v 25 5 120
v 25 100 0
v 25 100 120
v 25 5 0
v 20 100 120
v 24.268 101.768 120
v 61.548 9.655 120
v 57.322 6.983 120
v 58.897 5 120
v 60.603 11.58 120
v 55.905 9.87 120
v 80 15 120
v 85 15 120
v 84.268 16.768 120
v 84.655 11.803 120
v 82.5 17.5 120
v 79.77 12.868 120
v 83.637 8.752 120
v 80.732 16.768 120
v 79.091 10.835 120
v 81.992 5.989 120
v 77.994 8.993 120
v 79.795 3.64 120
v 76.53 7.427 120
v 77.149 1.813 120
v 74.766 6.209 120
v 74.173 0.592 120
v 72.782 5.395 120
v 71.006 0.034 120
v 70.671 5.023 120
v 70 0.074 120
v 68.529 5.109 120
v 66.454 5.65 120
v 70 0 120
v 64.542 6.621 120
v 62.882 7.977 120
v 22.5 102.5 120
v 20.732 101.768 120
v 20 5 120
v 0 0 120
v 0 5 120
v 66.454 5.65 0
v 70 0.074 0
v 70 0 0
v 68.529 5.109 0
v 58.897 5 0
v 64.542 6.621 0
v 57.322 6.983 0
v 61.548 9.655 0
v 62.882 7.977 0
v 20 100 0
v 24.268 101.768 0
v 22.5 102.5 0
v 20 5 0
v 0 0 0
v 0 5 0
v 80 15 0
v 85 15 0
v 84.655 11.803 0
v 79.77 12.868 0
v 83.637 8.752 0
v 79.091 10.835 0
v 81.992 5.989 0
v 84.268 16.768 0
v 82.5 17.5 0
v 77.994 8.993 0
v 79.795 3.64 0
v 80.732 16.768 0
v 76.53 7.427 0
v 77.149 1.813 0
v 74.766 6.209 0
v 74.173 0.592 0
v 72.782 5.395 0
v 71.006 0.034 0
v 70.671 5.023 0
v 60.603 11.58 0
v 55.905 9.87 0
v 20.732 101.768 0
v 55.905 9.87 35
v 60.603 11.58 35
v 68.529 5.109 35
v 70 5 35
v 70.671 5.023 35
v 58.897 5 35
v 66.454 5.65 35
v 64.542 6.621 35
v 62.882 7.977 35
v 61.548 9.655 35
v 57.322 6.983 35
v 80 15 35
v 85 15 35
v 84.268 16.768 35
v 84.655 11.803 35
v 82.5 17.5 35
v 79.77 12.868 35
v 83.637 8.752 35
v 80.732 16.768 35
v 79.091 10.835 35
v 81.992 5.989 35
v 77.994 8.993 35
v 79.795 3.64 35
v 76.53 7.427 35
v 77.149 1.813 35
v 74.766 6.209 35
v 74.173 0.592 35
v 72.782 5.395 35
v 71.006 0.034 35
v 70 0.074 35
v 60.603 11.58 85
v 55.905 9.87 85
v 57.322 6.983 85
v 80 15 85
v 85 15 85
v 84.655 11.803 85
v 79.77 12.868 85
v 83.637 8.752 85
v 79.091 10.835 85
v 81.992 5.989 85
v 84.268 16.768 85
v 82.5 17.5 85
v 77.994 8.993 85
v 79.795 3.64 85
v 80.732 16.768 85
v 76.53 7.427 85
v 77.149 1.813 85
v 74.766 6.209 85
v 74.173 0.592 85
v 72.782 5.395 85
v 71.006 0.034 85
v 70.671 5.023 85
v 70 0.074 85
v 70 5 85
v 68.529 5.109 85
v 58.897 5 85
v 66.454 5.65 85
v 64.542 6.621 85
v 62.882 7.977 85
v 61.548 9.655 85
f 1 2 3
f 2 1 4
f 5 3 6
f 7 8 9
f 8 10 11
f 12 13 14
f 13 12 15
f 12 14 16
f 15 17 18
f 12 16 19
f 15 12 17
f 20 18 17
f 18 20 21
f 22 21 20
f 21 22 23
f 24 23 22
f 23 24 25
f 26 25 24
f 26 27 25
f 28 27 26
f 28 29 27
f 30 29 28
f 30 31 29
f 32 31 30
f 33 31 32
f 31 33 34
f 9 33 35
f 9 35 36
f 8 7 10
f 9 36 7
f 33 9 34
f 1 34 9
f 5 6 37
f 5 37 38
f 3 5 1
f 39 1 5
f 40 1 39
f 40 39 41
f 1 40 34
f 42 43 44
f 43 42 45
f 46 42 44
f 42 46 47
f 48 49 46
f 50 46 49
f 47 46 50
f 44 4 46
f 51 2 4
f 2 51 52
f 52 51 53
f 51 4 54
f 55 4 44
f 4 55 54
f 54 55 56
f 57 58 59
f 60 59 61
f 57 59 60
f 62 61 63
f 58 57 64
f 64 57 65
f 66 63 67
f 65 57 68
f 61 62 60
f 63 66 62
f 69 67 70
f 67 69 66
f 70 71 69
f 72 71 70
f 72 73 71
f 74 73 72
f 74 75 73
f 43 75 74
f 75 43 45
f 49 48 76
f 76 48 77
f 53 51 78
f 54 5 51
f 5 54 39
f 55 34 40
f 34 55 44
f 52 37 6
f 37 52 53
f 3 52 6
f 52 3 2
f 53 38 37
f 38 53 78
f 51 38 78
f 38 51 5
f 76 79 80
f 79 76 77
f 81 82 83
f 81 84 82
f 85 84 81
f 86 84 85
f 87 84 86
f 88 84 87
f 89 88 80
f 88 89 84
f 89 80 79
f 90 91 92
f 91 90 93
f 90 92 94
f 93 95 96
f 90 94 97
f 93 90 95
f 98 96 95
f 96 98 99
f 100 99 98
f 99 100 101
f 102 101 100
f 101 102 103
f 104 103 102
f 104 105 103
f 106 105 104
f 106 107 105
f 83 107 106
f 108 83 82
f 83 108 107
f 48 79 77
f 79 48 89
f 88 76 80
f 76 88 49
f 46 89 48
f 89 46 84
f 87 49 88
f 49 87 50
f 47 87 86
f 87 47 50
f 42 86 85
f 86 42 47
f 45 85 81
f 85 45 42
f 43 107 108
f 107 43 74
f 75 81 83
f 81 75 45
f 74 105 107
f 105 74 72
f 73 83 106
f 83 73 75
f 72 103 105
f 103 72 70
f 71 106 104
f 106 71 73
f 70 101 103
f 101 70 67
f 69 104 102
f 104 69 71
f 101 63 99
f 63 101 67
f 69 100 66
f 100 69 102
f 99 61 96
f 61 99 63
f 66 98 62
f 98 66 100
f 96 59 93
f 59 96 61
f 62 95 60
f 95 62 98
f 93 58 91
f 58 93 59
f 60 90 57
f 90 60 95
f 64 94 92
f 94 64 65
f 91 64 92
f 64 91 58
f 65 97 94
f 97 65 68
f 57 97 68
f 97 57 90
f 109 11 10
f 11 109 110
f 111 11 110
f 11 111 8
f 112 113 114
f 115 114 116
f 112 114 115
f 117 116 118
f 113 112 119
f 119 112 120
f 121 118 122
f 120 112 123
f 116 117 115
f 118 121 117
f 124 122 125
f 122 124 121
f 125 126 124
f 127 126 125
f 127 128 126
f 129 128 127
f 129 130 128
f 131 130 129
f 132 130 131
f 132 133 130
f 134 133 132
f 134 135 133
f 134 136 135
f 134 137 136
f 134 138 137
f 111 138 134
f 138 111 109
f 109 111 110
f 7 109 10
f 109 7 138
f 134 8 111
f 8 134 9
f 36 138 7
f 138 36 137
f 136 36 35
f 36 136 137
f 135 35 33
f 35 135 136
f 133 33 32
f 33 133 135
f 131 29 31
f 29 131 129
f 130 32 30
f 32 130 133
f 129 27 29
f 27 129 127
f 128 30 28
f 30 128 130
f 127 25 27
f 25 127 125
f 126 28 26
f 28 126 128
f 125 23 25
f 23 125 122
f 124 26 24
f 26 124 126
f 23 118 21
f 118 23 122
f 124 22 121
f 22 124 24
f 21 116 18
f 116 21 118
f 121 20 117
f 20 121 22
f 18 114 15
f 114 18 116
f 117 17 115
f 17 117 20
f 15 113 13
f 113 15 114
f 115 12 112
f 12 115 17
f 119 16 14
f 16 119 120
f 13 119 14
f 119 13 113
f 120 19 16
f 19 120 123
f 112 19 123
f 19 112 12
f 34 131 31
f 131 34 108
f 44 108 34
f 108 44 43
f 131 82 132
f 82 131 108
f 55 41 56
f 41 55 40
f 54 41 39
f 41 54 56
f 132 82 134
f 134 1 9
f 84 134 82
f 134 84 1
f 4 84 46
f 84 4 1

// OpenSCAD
function kindle_width() = 120;
function kindle_height() = 170;
function kindle_thickness_with_case() = 14;
function kindle_bottom_center_cutout_width() = 50;

function stand_wall_thickness() = 5;
function stand_wall_thickness() = 5;

function stand_foot_depth() = 70;
function stand_foot_arch_a() = 160;
function stand_foot_arch_r() = 10;
function stand_height() = 100;

function stand_vertical_support_offset() = 50; // measured from front

module arch(r = stand_foot_arch_r(), t = stand_wall_thickness(), h = kindle_width(), a = stand_foot_arch_a()) {
       rotate_extrude(angle = a)
            translate([r, 0, 0])
                square([t, h]);
}

module stand_foot_arch_half() {
    half_section_width = (kindle_width() - kindle_bottom_center_cutout_width()) / 2;
    offset_x = stand_foot_depth();
    offset_y = stand_foot_arch_r() + stand_wall_thickness();

    round_end_offset_x = offset_x + stand_foot_arch_r() + stand_wall_thickness() / 2;
    union() {
        translate([offset_x, offset_y, 0]) rotate([0, 0, - stand_foot_arch_a()]) arch(h = half_section_width);
        translate([round_end_offset_x, offset_y, 0])
            cylinder(d = stand_wall_thickness(), h = half_section_width);
    }
}

module stand_foot_arch() {
    half_section_width = (kindle_width() - kindle_bottom_center_cutout_width()) / 2;

    right_side_offset_z = kindle_width() - half_section_width;

    stand_foot_arch_half();
    translate([0, 0, right_side_offset_z]) stand_foot_arch_half();
}

module stand_foot() {
    union() {
        cube([stand_foot_depth(), stand_wall_thickness(), kindle_width()]);
        stand_foot_arch();
    }
}

module stand_vertical_support() {
    offset_x = stand_foot_depth() - stand_vertical_support_offset();
    translate([offset_x, 0, 0])
    union() {
        cube([stand_wall_thickness(), stand_height(), kindle_width()]);
        round_top();
    }
}
module round_top() {
    translate([stand_wall_thickness() / 2, stand_height(), 0])
        cylinder(d = stand_wall_thickness(), h = kindle_width());

}

module kindle_simple_stand() {
    union() {
        stand_vertical_support();
        stand_foot();
    }
}

kindle_simple_stand();
